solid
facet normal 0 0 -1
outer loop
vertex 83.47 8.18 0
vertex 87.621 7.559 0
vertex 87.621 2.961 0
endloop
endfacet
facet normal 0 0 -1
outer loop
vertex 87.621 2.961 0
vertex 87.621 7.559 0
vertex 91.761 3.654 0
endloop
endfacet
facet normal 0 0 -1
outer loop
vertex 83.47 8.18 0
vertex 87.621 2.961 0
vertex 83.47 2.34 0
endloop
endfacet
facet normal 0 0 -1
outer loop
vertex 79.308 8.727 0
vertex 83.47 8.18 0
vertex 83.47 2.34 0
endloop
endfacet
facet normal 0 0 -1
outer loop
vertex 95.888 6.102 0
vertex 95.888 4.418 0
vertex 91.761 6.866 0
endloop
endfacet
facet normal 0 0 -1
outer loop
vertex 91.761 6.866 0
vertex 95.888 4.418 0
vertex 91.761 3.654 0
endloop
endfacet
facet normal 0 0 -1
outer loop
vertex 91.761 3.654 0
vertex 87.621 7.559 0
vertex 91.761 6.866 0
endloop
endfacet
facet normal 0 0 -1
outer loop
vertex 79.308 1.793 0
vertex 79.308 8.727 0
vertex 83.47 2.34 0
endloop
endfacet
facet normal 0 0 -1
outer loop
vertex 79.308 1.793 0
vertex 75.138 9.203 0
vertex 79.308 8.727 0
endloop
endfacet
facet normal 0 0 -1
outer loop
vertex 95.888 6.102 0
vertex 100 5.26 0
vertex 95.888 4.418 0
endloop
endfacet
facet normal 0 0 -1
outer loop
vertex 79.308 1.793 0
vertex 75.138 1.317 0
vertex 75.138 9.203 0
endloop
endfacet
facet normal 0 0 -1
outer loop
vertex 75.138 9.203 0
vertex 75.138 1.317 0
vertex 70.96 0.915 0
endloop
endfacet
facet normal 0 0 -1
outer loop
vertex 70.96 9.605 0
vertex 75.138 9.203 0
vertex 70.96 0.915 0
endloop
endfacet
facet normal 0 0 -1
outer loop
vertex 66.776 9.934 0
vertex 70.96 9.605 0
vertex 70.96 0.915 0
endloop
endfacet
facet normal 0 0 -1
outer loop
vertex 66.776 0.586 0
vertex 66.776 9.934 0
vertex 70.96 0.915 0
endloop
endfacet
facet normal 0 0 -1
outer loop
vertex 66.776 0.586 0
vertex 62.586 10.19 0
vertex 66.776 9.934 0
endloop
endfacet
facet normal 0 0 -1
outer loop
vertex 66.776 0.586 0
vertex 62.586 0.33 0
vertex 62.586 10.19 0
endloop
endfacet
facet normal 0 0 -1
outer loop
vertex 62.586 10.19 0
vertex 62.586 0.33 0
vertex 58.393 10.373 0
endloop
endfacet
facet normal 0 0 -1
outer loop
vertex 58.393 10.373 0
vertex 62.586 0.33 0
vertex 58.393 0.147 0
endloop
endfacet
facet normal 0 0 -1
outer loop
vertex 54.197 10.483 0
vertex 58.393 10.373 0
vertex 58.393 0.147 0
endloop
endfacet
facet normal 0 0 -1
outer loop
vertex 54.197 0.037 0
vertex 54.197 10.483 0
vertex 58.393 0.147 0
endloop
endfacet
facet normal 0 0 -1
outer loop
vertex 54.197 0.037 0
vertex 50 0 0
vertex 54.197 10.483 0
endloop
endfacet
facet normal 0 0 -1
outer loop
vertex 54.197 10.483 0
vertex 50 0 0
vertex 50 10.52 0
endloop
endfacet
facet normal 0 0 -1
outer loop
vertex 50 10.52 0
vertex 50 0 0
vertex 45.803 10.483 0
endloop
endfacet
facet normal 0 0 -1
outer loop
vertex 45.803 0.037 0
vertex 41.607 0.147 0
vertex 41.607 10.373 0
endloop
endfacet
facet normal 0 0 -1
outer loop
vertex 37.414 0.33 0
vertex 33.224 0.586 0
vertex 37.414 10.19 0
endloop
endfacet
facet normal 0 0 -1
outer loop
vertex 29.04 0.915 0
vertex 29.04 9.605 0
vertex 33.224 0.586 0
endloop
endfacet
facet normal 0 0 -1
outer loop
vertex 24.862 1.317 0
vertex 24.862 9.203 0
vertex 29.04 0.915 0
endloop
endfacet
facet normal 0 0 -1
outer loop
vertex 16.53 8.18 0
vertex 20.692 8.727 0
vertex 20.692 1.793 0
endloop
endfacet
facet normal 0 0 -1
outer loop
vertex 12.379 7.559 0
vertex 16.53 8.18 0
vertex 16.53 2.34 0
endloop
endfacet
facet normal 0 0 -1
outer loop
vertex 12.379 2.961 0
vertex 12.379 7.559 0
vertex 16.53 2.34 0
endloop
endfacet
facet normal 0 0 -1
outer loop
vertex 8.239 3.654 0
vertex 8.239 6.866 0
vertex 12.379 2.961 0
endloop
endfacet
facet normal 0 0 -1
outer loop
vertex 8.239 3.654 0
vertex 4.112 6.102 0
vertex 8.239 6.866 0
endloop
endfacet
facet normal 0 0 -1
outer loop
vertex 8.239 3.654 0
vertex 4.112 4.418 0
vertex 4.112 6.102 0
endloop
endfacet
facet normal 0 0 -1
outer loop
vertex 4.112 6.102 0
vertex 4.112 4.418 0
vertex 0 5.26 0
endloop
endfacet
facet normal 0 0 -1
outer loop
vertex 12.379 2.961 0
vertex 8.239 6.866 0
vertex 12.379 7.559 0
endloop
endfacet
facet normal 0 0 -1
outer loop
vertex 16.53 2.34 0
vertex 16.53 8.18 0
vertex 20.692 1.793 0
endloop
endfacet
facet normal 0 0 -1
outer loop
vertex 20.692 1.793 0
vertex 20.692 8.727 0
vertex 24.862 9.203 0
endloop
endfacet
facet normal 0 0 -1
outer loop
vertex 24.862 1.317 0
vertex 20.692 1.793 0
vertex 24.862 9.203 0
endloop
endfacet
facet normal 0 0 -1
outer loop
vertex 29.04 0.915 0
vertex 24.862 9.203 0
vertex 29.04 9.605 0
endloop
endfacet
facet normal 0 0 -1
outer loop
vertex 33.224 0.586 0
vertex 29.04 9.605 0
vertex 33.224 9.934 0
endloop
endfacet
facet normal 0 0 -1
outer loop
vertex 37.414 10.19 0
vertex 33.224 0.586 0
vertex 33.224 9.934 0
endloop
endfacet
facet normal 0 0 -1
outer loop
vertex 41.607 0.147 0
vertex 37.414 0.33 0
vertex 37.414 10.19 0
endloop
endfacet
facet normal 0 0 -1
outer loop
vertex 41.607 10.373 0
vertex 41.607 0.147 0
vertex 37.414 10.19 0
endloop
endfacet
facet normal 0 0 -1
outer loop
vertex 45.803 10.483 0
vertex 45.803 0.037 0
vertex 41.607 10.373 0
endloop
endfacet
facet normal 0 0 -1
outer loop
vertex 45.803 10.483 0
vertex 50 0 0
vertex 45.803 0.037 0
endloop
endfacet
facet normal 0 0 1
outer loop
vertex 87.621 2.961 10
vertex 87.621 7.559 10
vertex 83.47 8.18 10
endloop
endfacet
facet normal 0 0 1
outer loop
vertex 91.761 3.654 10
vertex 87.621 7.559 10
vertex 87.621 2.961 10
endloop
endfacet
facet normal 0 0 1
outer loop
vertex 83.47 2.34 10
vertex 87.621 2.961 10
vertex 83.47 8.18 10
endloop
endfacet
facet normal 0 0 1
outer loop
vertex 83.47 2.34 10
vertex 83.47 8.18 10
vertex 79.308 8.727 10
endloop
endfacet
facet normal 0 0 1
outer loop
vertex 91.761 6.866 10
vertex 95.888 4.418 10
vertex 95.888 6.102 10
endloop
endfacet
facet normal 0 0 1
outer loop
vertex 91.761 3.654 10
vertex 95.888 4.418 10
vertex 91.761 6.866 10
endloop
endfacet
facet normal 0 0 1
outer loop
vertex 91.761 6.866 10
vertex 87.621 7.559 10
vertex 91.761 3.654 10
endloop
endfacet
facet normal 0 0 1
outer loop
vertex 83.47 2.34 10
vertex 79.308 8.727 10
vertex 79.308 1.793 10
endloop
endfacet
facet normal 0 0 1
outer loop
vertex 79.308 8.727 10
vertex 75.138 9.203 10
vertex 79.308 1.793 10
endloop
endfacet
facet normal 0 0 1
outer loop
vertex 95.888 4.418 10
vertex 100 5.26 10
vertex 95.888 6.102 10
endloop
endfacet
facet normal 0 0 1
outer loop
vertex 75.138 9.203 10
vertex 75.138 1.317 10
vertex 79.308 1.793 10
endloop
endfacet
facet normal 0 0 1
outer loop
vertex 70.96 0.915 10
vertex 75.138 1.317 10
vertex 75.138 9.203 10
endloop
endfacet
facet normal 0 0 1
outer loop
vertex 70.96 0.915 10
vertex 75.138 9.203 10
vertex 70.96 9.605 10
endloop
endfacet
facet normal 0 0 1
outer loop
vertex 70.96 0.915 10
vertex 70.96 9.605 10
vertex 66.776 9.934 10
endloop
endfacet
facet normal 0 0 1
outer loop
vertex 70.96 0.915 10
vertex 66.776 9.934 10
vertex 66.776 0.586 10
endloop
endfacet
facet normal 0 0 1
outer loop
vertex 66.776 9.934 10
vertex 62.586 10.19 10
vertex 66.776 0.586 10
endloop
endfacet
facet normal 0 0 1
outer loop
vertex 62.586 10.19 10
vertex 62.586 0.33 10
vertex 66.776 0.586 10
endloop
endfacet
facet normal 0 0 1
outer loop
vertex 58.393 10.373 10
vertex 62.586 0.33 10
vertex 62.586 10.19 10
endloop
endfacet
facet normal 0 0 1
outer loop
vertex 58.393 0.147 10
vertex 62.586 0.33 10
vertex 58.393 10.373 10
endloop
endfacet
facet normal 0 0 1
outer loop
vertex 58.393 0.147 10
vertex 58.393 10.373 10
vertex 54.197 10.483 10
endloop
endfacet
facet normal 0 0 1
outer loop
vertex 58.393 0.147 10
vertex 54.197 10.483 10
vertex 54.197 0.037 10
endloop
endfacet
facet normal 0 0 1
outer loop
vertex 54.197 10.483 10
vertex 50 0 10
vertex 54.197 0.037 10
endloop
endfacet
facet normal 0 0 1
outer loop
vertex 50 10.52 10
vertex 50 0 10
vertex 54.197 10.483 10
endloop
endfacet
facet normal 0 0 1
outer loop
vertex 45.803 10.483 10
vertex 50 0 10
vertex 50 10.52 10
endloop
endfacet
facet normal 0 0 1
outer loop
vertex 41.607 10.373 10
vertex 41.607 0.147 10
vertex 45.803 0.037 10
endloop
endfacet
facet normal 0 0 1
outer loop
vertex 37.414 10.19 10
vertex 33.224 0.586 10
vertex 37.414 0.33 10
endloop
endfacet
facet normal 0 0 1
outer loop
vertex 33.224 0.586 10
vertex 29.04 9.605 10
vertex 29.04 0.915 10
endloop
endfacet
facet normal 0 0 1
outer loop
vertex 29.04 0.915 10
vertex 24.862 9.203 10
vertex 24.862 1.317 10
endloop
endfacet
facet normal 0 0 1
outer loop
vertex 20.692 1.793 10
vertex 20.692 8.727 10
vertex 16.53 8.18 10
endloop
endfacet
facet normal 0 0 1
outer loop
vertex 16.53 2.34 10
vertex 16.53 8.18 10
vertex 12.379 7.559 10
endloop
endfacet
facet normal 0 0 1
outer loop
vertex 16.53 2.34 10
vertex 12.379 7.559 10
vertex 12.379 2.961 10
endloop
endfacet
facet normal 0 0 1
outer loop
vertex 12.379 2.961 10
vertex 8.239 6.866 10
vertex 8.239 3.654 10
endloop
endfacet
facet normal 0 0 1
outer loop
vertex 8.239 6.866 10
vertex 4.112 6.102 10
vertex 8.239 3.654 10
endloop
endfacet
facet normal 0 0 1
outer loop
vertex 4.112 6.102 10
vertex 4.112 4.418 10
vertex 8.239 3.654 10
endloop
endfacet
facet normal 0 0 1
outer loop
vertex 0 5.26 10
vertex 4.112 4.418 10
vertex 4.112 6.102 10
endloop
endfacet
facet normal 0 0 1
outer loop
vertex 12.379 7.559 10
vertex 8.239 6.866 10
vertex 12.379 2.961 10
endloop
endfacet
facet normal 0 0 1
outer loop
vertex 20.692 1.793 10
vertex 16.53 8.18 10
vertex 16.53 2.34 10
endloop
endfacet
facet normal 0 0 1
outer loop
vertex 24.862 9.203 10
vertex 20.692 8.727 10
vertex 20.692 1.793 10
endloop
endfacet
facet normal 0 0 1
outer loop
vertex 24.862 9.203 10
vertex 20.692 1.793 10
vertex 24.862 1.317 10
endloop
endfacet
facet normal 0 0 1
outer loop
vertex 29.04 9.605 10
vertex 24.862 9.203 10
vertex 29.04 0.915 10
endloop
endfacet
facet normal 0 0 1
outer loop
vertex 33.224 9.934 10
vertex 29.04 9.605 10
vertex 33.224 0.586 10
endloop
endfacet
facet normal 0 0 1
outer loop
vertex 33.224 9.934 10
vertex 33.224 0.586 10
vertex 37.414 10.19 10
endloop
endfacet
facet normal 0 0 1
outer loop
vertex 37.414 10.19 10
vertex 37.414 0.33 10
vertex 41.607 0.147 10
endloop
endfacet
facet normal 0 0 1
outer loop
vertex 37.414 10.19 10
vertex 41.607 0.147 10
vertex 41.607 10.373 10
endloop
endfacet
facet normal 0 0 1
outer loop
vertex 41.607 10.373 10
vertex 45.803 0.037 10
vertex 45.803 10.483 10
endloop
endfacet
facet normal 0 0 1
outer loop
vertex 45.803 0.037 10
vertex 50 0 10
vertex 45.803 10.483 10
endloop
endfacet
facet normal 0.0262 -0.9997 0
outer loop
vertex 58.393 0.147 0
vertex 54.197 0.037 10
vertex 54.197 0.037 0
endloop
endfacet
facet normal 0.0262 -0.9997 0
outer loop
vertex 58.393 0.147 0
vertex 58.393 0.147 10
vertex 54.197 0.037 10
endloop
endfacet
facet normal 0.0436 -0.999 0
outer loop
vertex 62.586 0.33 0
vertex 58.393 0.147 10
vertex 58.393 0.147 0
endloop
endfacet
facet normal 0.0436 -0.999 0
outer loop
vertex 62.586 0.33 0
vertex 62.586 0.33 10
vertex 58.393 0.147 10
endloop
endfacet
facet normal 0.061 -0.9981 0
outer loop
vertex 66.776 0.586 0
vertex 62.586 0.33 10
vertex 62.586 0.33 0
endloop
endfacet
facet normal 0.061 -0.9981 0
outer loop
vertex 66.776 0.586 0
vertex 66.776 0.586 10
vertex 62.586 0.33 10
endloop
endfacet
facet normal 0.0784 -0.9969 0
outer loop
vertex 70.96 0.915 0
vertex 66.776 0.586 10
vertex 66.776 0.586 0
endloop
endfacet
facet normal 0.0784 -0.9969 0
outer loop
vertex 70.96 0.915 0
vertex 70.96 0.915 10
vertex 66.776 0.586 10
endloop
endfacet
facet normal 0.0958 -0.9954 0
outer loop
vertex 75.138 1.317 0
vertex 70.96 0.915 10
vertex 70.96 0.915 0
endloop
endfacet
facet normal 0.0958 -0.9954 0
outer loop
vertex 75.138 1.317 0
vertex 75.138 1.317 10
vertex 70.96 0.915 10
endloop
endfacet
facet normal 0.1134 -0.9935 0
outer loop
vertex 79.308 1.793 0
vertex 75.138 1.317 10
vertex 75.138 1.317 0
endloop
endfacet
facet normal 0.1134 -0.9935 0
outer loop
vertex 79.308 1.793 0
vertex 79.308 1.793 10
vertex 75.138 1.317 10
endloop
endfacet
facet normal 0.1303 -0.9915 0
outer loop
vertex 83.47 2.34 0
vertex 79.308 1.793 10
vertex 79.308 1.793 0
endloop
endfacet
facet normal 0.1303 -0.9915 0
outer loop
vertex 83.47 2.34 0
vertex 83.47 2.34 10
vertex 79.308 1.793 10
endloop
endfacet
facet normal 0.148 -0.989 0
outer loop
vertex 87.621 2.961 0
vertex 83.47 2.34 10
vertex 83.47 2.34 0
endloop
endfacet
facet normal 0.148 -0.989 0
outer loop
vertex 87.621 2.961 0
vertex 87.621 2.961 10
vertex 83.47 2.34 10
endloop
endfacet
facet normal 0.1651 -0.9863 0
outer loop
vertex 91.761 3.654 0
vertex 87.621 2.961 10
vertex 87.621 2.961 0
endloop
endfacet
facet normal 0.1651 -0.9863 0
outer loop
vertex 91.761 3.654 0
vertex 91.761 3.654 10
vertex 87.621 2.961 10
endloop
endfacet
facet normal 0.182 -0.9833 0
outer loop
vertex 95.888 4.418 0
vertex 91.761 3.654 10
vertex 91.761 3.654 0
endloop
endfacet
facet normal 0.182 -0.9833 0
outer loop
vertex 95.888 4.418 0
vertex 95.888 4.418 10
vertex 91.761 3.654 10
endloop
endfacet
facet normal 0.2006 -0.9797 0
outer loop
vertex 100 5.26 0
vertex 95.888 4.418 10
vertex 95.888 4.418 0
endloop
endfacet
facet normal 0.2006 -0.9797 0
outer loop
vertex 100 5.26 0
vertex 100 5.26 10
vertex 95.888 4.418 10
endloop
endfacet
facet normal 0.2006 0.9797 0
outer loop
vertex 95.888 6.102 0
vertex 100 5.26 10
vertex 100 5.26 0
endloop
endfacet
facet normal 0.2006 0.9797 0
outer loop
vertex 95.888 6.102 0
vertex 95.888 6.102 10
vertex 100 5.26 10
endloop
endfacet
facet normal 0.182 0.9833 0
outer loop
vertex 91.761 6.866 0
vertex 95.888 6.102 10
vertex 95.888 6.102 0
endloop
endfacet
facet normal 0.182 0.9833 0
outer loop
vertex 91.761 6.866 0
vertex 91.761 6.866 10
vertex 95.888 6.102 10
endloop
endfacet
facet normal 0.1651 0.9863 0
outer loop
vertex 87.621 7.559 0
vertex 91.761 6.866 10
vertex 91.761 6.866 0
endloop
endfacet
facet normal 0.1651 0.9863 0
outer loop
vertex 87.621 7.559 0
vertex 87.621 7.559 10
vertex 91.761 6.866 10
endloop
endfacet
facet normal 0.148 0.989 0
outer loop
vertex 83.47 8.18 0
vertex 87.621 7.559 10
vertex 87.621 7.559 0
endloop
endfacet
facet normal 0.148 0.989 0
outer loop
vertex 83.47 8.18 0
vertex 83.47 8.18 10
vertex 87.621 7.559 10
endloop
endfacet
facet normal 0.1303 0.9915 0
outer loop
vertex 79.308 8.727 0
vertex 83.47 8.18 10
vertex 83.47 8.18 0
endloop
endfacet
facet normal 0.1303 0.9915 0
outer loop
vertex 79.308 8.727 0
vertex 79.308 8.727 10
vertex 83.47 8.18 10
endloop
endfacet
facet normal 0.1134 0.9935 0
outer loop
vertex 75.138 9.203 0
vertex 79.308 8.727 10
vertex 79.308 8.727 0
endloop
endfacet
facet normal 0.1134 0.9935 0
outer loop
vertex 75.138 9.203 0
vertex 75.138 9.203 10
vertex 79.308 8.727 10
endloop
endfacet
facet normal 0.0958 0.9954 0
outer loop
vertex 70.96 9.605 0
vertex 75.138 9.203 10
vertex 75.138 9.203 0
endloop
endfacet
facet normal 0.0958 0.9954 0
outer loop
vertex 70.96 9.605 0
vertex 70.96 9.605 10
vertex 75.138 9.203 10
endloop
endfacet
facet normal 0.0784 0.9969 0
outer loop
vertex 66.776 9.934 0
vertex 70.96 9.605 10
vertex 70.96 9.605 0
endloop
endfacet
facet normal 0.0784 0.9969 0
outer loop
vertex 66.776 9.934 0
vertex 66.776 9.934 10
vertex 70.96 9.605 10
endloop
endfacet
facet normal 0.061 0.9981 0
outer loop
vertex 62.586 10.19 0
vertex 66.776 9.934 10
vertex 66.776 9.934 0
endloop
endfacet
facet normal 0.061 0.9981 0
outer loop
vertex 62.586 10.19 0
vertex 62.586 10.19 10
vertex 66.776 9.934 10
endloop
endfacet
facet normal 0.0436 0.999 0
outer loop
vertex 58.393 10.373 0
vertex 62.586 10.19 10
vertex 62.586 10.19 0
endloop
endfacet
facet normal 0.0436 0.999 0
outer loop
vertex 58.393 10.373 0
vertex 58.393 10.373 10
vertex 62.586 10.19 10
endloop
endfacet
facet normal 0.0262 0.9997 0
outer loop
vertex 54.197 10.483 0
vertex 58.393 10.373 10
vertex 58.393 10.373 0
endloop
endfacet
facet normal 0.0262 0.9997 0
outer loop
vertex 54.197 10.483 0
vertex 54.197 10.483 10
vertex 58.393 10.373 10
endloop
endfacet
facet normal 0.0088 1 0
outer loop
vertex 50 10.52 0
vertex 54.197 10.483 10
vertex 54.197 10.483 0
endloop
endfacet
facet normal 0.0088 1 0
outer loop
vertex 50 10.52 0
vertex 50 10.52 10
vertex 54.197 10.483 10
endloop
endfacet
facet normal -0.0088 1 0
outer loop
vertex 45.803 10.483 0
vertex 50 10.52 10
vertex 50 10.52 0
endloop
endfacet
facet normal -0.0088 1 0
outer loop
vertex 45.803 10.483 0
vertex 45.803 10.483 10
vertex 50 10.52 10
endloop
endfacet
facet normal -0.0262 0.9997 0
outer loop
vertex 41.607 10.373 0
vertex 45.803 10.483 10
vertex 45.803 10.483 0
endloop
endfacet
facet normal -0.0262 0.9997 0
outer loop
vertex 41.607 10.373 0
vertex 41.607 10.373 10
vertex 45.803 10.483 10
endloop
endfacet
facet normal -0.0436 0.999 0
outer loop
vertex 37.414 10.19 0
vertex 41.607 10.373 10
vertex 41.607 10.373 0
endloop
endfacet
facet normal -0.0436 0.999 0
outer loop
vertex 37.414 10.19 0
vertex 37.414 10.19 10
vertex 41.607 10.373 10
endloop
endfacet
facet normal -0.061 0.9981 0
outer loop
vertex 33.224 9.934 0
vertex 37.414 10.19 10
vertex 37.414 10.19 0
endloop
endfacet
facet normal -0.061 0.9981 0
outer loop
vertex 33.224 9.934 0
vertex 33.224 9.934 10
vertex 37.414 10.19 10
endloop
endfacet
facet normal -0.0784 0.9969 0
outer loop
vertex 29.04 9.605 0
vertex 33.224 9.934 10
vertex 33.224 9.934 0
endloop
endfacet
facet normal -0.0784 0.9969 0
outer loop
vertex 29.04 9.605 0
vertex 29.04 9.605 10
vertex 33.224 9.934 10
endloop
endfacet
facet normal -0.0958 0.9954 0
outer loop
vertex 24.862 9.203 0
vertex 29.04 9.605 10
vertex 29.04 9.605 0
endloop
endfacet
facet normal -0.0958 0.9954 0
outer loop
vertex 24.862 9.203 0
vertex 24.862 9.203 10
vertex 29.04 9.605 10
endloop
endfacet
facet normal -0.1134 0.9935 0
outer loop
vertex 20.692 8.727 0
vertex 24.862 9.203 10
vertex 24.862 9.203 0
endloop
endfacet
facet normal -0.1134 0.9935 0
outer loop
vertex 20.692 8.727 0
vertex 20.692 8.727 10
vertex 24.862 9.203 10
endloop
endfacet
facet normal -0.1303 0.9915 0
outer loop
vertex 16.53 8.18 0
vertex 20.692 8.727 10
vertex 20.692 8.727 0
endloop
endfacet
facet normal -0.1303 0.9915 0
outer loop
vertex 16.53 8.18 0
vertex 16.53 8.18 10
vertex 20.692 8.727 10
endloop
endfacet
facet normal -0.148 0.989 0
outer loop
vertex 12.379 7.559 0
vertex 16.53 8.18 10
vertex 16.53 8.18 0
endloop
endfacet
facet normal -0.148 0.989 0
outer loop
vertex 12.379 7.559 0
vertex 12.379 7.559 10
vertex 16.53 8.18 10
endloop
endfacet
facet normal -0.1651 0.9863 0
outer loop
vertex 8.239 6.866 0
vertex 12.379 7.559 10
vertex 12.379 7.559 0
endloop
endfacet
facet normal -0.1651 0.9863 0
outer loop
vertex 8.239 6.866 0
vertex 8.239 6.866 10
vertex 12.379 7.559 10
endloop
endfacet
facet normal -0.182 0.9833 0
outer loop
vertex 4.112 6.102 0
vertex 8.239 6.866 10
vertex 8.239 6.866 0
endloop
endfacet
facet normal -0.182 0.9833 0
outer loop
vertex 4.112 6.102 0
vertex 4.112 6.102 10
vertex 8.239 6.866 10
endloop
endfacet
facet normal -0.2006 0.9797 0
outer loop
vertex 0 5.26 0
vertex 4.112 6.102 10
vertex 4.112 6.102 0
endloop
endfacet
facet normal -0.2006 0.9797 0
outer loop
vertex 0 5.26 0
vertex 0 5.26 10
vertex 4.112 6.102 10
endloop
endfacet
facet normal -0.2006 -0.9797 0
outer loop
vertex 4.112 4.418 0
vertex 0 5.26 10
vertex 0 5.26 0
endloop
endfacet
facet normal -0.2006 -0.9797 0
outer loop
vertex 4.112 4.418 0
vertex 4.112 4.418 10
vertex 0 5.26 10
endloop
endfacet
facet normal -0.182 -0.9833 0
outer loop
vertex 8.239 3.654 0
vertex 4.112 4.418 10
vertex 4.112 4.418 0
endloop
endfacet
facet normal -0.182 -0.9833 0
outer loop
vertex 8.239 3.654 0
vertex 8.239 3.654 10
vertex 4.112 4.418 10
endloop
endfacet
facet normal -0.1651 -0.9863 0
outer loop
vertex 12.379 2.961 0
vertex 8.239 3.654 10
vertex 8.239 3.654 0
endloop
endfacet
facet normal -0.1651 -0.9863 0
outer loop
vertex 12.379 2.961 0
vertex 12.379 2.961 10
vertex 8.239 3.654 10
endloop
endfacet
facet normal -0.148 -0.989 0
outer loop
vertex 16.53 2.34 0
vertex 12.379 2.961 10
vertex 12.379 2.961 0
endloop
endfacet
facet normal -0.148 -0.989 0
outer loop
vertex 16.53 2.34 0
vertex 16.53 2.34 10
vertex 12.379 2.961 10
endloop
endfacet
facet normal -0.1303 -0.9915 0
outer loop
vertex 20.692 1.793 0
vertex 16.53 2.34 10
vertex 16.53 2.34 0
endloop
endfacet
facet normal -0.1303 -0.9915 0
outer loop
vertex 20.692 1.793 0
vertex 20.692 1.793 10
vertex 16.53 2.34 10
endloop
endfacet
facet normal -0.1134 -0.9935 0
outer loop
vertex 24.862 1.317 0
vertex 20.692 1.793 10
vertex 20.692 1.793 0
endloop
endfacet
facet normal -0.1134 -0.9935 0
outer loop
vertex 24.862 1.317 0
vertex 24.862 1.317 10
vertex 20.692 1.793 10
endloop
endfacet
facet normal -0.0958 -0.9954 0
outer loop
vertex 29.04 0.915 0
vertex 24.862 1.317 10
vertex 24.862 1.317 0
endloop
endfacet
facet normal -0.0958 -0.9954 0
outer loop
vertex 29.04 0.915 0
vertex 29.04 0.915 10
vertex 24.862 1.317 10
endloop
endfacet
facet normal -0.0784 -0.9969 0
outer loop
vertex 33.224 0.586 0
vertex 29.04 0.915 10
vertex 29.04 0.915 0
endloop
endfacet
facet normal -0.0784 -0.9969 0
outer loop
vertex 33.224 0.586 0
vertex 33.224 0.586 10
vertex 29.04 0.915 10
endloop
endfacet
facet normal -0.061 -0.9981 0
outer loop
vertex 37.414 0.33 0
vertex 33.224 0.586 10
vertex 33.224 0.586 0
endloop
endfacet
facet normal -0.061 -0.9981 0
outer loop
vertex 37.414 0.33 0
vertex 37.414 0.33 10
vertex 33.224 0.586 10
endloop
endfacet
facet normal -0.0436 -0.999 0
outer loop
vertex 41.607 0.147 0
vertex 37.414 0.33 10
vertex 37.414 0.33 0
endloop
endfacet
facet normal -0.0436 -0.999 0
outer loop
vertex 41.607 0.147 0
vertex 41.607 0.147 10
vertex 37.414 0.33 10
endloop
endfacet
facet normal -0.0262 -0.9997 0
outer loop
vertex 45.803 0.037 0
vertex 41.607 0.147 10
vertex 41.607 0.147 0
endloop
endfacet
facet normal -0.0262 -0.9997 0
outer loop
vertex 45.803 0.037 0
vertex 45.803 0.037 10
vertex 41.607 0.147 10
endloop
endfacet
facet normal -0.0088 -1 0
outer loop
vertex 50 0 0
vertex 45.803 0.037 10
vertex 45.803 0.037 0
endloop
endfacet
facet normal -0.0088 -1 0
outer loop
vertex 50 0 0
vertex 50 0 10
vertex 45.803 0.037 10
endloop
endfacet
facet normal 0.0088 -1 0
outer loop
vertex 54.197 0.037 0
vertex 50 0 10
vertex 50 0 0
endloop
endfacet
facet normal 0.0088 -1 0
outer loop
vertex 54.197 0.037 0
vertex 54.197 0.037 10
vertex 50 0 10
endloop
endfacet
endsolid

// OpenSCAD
$fn = 32;

// ----------------------------------------------------------------------
// Arc profile plate: lens, 48 points
// ----------------------------------------------------------------------

// --- parameters (mm) ---
lens_chord = 100;         // chord length of the lens, X
arc_r = 240.49;           // radius of both arcs
arc_angle = 24;           // angle of each arc, degrees
sagitta = 5.26;           // bulge of each arc (half the lens height)
arc_step = 1;             // sampling step of the arcs, degrees
plate_t = 10;             // plate thickness, Z
fit_tol = 0.02;           // declared fit tolerance (prompt contract)
free_tol = 0.2;           // declared free tolerance (prompt contract)

bbox_y = 2 * sagitta;  // full lens height

profile = [[100, 5.26], [95.888, 6.102], [91.761, 6.866], [87.621, 7.559], [83.47, 8.18], [79.308, 8.727], [75.138, 9.203], [70.96, 9.605], [66.776, 9.934], [62.586, 10.19], [58.393, 10.373], [54.197, 10.483], [50, 10.52], [45.803, 10.483], [41.607, 10.373], [37.414, 10.19], [33.224, 9.934], [29.04, 9.605], [24.862, 9.203], [20.692, 8.727], [16.53, 8.18], [12.379, 7.559], [8.239, 6.866], [4.112, 6.102], [0, 5.26], [4.112, 4.418], [8.239, 3.654], [12.379, 2.961], [16.53, 2.34], [20.692, 1.793], [24.862, 1.317], [29.04, 0.915], [33.224, 0.586], [37.414, 0.33], [41.607, 0.147], [45.803, 0.037], [50, 0], [54.197, 0.037], [58.393, 0.147], [62.586, 0.33], [66.776, 0.586], [70.96, 0.915], [75.138, 1.317], [79.308, 1.793], [83.47, 2.34], [87.621, 2.961], [91.761, 3.654], [95.888, 4.418]];  // primary outline, 48 points, counter clockwise

// --- the one profile operation ---
linear_extrude(height = plate_t) polygon(points = profile);
